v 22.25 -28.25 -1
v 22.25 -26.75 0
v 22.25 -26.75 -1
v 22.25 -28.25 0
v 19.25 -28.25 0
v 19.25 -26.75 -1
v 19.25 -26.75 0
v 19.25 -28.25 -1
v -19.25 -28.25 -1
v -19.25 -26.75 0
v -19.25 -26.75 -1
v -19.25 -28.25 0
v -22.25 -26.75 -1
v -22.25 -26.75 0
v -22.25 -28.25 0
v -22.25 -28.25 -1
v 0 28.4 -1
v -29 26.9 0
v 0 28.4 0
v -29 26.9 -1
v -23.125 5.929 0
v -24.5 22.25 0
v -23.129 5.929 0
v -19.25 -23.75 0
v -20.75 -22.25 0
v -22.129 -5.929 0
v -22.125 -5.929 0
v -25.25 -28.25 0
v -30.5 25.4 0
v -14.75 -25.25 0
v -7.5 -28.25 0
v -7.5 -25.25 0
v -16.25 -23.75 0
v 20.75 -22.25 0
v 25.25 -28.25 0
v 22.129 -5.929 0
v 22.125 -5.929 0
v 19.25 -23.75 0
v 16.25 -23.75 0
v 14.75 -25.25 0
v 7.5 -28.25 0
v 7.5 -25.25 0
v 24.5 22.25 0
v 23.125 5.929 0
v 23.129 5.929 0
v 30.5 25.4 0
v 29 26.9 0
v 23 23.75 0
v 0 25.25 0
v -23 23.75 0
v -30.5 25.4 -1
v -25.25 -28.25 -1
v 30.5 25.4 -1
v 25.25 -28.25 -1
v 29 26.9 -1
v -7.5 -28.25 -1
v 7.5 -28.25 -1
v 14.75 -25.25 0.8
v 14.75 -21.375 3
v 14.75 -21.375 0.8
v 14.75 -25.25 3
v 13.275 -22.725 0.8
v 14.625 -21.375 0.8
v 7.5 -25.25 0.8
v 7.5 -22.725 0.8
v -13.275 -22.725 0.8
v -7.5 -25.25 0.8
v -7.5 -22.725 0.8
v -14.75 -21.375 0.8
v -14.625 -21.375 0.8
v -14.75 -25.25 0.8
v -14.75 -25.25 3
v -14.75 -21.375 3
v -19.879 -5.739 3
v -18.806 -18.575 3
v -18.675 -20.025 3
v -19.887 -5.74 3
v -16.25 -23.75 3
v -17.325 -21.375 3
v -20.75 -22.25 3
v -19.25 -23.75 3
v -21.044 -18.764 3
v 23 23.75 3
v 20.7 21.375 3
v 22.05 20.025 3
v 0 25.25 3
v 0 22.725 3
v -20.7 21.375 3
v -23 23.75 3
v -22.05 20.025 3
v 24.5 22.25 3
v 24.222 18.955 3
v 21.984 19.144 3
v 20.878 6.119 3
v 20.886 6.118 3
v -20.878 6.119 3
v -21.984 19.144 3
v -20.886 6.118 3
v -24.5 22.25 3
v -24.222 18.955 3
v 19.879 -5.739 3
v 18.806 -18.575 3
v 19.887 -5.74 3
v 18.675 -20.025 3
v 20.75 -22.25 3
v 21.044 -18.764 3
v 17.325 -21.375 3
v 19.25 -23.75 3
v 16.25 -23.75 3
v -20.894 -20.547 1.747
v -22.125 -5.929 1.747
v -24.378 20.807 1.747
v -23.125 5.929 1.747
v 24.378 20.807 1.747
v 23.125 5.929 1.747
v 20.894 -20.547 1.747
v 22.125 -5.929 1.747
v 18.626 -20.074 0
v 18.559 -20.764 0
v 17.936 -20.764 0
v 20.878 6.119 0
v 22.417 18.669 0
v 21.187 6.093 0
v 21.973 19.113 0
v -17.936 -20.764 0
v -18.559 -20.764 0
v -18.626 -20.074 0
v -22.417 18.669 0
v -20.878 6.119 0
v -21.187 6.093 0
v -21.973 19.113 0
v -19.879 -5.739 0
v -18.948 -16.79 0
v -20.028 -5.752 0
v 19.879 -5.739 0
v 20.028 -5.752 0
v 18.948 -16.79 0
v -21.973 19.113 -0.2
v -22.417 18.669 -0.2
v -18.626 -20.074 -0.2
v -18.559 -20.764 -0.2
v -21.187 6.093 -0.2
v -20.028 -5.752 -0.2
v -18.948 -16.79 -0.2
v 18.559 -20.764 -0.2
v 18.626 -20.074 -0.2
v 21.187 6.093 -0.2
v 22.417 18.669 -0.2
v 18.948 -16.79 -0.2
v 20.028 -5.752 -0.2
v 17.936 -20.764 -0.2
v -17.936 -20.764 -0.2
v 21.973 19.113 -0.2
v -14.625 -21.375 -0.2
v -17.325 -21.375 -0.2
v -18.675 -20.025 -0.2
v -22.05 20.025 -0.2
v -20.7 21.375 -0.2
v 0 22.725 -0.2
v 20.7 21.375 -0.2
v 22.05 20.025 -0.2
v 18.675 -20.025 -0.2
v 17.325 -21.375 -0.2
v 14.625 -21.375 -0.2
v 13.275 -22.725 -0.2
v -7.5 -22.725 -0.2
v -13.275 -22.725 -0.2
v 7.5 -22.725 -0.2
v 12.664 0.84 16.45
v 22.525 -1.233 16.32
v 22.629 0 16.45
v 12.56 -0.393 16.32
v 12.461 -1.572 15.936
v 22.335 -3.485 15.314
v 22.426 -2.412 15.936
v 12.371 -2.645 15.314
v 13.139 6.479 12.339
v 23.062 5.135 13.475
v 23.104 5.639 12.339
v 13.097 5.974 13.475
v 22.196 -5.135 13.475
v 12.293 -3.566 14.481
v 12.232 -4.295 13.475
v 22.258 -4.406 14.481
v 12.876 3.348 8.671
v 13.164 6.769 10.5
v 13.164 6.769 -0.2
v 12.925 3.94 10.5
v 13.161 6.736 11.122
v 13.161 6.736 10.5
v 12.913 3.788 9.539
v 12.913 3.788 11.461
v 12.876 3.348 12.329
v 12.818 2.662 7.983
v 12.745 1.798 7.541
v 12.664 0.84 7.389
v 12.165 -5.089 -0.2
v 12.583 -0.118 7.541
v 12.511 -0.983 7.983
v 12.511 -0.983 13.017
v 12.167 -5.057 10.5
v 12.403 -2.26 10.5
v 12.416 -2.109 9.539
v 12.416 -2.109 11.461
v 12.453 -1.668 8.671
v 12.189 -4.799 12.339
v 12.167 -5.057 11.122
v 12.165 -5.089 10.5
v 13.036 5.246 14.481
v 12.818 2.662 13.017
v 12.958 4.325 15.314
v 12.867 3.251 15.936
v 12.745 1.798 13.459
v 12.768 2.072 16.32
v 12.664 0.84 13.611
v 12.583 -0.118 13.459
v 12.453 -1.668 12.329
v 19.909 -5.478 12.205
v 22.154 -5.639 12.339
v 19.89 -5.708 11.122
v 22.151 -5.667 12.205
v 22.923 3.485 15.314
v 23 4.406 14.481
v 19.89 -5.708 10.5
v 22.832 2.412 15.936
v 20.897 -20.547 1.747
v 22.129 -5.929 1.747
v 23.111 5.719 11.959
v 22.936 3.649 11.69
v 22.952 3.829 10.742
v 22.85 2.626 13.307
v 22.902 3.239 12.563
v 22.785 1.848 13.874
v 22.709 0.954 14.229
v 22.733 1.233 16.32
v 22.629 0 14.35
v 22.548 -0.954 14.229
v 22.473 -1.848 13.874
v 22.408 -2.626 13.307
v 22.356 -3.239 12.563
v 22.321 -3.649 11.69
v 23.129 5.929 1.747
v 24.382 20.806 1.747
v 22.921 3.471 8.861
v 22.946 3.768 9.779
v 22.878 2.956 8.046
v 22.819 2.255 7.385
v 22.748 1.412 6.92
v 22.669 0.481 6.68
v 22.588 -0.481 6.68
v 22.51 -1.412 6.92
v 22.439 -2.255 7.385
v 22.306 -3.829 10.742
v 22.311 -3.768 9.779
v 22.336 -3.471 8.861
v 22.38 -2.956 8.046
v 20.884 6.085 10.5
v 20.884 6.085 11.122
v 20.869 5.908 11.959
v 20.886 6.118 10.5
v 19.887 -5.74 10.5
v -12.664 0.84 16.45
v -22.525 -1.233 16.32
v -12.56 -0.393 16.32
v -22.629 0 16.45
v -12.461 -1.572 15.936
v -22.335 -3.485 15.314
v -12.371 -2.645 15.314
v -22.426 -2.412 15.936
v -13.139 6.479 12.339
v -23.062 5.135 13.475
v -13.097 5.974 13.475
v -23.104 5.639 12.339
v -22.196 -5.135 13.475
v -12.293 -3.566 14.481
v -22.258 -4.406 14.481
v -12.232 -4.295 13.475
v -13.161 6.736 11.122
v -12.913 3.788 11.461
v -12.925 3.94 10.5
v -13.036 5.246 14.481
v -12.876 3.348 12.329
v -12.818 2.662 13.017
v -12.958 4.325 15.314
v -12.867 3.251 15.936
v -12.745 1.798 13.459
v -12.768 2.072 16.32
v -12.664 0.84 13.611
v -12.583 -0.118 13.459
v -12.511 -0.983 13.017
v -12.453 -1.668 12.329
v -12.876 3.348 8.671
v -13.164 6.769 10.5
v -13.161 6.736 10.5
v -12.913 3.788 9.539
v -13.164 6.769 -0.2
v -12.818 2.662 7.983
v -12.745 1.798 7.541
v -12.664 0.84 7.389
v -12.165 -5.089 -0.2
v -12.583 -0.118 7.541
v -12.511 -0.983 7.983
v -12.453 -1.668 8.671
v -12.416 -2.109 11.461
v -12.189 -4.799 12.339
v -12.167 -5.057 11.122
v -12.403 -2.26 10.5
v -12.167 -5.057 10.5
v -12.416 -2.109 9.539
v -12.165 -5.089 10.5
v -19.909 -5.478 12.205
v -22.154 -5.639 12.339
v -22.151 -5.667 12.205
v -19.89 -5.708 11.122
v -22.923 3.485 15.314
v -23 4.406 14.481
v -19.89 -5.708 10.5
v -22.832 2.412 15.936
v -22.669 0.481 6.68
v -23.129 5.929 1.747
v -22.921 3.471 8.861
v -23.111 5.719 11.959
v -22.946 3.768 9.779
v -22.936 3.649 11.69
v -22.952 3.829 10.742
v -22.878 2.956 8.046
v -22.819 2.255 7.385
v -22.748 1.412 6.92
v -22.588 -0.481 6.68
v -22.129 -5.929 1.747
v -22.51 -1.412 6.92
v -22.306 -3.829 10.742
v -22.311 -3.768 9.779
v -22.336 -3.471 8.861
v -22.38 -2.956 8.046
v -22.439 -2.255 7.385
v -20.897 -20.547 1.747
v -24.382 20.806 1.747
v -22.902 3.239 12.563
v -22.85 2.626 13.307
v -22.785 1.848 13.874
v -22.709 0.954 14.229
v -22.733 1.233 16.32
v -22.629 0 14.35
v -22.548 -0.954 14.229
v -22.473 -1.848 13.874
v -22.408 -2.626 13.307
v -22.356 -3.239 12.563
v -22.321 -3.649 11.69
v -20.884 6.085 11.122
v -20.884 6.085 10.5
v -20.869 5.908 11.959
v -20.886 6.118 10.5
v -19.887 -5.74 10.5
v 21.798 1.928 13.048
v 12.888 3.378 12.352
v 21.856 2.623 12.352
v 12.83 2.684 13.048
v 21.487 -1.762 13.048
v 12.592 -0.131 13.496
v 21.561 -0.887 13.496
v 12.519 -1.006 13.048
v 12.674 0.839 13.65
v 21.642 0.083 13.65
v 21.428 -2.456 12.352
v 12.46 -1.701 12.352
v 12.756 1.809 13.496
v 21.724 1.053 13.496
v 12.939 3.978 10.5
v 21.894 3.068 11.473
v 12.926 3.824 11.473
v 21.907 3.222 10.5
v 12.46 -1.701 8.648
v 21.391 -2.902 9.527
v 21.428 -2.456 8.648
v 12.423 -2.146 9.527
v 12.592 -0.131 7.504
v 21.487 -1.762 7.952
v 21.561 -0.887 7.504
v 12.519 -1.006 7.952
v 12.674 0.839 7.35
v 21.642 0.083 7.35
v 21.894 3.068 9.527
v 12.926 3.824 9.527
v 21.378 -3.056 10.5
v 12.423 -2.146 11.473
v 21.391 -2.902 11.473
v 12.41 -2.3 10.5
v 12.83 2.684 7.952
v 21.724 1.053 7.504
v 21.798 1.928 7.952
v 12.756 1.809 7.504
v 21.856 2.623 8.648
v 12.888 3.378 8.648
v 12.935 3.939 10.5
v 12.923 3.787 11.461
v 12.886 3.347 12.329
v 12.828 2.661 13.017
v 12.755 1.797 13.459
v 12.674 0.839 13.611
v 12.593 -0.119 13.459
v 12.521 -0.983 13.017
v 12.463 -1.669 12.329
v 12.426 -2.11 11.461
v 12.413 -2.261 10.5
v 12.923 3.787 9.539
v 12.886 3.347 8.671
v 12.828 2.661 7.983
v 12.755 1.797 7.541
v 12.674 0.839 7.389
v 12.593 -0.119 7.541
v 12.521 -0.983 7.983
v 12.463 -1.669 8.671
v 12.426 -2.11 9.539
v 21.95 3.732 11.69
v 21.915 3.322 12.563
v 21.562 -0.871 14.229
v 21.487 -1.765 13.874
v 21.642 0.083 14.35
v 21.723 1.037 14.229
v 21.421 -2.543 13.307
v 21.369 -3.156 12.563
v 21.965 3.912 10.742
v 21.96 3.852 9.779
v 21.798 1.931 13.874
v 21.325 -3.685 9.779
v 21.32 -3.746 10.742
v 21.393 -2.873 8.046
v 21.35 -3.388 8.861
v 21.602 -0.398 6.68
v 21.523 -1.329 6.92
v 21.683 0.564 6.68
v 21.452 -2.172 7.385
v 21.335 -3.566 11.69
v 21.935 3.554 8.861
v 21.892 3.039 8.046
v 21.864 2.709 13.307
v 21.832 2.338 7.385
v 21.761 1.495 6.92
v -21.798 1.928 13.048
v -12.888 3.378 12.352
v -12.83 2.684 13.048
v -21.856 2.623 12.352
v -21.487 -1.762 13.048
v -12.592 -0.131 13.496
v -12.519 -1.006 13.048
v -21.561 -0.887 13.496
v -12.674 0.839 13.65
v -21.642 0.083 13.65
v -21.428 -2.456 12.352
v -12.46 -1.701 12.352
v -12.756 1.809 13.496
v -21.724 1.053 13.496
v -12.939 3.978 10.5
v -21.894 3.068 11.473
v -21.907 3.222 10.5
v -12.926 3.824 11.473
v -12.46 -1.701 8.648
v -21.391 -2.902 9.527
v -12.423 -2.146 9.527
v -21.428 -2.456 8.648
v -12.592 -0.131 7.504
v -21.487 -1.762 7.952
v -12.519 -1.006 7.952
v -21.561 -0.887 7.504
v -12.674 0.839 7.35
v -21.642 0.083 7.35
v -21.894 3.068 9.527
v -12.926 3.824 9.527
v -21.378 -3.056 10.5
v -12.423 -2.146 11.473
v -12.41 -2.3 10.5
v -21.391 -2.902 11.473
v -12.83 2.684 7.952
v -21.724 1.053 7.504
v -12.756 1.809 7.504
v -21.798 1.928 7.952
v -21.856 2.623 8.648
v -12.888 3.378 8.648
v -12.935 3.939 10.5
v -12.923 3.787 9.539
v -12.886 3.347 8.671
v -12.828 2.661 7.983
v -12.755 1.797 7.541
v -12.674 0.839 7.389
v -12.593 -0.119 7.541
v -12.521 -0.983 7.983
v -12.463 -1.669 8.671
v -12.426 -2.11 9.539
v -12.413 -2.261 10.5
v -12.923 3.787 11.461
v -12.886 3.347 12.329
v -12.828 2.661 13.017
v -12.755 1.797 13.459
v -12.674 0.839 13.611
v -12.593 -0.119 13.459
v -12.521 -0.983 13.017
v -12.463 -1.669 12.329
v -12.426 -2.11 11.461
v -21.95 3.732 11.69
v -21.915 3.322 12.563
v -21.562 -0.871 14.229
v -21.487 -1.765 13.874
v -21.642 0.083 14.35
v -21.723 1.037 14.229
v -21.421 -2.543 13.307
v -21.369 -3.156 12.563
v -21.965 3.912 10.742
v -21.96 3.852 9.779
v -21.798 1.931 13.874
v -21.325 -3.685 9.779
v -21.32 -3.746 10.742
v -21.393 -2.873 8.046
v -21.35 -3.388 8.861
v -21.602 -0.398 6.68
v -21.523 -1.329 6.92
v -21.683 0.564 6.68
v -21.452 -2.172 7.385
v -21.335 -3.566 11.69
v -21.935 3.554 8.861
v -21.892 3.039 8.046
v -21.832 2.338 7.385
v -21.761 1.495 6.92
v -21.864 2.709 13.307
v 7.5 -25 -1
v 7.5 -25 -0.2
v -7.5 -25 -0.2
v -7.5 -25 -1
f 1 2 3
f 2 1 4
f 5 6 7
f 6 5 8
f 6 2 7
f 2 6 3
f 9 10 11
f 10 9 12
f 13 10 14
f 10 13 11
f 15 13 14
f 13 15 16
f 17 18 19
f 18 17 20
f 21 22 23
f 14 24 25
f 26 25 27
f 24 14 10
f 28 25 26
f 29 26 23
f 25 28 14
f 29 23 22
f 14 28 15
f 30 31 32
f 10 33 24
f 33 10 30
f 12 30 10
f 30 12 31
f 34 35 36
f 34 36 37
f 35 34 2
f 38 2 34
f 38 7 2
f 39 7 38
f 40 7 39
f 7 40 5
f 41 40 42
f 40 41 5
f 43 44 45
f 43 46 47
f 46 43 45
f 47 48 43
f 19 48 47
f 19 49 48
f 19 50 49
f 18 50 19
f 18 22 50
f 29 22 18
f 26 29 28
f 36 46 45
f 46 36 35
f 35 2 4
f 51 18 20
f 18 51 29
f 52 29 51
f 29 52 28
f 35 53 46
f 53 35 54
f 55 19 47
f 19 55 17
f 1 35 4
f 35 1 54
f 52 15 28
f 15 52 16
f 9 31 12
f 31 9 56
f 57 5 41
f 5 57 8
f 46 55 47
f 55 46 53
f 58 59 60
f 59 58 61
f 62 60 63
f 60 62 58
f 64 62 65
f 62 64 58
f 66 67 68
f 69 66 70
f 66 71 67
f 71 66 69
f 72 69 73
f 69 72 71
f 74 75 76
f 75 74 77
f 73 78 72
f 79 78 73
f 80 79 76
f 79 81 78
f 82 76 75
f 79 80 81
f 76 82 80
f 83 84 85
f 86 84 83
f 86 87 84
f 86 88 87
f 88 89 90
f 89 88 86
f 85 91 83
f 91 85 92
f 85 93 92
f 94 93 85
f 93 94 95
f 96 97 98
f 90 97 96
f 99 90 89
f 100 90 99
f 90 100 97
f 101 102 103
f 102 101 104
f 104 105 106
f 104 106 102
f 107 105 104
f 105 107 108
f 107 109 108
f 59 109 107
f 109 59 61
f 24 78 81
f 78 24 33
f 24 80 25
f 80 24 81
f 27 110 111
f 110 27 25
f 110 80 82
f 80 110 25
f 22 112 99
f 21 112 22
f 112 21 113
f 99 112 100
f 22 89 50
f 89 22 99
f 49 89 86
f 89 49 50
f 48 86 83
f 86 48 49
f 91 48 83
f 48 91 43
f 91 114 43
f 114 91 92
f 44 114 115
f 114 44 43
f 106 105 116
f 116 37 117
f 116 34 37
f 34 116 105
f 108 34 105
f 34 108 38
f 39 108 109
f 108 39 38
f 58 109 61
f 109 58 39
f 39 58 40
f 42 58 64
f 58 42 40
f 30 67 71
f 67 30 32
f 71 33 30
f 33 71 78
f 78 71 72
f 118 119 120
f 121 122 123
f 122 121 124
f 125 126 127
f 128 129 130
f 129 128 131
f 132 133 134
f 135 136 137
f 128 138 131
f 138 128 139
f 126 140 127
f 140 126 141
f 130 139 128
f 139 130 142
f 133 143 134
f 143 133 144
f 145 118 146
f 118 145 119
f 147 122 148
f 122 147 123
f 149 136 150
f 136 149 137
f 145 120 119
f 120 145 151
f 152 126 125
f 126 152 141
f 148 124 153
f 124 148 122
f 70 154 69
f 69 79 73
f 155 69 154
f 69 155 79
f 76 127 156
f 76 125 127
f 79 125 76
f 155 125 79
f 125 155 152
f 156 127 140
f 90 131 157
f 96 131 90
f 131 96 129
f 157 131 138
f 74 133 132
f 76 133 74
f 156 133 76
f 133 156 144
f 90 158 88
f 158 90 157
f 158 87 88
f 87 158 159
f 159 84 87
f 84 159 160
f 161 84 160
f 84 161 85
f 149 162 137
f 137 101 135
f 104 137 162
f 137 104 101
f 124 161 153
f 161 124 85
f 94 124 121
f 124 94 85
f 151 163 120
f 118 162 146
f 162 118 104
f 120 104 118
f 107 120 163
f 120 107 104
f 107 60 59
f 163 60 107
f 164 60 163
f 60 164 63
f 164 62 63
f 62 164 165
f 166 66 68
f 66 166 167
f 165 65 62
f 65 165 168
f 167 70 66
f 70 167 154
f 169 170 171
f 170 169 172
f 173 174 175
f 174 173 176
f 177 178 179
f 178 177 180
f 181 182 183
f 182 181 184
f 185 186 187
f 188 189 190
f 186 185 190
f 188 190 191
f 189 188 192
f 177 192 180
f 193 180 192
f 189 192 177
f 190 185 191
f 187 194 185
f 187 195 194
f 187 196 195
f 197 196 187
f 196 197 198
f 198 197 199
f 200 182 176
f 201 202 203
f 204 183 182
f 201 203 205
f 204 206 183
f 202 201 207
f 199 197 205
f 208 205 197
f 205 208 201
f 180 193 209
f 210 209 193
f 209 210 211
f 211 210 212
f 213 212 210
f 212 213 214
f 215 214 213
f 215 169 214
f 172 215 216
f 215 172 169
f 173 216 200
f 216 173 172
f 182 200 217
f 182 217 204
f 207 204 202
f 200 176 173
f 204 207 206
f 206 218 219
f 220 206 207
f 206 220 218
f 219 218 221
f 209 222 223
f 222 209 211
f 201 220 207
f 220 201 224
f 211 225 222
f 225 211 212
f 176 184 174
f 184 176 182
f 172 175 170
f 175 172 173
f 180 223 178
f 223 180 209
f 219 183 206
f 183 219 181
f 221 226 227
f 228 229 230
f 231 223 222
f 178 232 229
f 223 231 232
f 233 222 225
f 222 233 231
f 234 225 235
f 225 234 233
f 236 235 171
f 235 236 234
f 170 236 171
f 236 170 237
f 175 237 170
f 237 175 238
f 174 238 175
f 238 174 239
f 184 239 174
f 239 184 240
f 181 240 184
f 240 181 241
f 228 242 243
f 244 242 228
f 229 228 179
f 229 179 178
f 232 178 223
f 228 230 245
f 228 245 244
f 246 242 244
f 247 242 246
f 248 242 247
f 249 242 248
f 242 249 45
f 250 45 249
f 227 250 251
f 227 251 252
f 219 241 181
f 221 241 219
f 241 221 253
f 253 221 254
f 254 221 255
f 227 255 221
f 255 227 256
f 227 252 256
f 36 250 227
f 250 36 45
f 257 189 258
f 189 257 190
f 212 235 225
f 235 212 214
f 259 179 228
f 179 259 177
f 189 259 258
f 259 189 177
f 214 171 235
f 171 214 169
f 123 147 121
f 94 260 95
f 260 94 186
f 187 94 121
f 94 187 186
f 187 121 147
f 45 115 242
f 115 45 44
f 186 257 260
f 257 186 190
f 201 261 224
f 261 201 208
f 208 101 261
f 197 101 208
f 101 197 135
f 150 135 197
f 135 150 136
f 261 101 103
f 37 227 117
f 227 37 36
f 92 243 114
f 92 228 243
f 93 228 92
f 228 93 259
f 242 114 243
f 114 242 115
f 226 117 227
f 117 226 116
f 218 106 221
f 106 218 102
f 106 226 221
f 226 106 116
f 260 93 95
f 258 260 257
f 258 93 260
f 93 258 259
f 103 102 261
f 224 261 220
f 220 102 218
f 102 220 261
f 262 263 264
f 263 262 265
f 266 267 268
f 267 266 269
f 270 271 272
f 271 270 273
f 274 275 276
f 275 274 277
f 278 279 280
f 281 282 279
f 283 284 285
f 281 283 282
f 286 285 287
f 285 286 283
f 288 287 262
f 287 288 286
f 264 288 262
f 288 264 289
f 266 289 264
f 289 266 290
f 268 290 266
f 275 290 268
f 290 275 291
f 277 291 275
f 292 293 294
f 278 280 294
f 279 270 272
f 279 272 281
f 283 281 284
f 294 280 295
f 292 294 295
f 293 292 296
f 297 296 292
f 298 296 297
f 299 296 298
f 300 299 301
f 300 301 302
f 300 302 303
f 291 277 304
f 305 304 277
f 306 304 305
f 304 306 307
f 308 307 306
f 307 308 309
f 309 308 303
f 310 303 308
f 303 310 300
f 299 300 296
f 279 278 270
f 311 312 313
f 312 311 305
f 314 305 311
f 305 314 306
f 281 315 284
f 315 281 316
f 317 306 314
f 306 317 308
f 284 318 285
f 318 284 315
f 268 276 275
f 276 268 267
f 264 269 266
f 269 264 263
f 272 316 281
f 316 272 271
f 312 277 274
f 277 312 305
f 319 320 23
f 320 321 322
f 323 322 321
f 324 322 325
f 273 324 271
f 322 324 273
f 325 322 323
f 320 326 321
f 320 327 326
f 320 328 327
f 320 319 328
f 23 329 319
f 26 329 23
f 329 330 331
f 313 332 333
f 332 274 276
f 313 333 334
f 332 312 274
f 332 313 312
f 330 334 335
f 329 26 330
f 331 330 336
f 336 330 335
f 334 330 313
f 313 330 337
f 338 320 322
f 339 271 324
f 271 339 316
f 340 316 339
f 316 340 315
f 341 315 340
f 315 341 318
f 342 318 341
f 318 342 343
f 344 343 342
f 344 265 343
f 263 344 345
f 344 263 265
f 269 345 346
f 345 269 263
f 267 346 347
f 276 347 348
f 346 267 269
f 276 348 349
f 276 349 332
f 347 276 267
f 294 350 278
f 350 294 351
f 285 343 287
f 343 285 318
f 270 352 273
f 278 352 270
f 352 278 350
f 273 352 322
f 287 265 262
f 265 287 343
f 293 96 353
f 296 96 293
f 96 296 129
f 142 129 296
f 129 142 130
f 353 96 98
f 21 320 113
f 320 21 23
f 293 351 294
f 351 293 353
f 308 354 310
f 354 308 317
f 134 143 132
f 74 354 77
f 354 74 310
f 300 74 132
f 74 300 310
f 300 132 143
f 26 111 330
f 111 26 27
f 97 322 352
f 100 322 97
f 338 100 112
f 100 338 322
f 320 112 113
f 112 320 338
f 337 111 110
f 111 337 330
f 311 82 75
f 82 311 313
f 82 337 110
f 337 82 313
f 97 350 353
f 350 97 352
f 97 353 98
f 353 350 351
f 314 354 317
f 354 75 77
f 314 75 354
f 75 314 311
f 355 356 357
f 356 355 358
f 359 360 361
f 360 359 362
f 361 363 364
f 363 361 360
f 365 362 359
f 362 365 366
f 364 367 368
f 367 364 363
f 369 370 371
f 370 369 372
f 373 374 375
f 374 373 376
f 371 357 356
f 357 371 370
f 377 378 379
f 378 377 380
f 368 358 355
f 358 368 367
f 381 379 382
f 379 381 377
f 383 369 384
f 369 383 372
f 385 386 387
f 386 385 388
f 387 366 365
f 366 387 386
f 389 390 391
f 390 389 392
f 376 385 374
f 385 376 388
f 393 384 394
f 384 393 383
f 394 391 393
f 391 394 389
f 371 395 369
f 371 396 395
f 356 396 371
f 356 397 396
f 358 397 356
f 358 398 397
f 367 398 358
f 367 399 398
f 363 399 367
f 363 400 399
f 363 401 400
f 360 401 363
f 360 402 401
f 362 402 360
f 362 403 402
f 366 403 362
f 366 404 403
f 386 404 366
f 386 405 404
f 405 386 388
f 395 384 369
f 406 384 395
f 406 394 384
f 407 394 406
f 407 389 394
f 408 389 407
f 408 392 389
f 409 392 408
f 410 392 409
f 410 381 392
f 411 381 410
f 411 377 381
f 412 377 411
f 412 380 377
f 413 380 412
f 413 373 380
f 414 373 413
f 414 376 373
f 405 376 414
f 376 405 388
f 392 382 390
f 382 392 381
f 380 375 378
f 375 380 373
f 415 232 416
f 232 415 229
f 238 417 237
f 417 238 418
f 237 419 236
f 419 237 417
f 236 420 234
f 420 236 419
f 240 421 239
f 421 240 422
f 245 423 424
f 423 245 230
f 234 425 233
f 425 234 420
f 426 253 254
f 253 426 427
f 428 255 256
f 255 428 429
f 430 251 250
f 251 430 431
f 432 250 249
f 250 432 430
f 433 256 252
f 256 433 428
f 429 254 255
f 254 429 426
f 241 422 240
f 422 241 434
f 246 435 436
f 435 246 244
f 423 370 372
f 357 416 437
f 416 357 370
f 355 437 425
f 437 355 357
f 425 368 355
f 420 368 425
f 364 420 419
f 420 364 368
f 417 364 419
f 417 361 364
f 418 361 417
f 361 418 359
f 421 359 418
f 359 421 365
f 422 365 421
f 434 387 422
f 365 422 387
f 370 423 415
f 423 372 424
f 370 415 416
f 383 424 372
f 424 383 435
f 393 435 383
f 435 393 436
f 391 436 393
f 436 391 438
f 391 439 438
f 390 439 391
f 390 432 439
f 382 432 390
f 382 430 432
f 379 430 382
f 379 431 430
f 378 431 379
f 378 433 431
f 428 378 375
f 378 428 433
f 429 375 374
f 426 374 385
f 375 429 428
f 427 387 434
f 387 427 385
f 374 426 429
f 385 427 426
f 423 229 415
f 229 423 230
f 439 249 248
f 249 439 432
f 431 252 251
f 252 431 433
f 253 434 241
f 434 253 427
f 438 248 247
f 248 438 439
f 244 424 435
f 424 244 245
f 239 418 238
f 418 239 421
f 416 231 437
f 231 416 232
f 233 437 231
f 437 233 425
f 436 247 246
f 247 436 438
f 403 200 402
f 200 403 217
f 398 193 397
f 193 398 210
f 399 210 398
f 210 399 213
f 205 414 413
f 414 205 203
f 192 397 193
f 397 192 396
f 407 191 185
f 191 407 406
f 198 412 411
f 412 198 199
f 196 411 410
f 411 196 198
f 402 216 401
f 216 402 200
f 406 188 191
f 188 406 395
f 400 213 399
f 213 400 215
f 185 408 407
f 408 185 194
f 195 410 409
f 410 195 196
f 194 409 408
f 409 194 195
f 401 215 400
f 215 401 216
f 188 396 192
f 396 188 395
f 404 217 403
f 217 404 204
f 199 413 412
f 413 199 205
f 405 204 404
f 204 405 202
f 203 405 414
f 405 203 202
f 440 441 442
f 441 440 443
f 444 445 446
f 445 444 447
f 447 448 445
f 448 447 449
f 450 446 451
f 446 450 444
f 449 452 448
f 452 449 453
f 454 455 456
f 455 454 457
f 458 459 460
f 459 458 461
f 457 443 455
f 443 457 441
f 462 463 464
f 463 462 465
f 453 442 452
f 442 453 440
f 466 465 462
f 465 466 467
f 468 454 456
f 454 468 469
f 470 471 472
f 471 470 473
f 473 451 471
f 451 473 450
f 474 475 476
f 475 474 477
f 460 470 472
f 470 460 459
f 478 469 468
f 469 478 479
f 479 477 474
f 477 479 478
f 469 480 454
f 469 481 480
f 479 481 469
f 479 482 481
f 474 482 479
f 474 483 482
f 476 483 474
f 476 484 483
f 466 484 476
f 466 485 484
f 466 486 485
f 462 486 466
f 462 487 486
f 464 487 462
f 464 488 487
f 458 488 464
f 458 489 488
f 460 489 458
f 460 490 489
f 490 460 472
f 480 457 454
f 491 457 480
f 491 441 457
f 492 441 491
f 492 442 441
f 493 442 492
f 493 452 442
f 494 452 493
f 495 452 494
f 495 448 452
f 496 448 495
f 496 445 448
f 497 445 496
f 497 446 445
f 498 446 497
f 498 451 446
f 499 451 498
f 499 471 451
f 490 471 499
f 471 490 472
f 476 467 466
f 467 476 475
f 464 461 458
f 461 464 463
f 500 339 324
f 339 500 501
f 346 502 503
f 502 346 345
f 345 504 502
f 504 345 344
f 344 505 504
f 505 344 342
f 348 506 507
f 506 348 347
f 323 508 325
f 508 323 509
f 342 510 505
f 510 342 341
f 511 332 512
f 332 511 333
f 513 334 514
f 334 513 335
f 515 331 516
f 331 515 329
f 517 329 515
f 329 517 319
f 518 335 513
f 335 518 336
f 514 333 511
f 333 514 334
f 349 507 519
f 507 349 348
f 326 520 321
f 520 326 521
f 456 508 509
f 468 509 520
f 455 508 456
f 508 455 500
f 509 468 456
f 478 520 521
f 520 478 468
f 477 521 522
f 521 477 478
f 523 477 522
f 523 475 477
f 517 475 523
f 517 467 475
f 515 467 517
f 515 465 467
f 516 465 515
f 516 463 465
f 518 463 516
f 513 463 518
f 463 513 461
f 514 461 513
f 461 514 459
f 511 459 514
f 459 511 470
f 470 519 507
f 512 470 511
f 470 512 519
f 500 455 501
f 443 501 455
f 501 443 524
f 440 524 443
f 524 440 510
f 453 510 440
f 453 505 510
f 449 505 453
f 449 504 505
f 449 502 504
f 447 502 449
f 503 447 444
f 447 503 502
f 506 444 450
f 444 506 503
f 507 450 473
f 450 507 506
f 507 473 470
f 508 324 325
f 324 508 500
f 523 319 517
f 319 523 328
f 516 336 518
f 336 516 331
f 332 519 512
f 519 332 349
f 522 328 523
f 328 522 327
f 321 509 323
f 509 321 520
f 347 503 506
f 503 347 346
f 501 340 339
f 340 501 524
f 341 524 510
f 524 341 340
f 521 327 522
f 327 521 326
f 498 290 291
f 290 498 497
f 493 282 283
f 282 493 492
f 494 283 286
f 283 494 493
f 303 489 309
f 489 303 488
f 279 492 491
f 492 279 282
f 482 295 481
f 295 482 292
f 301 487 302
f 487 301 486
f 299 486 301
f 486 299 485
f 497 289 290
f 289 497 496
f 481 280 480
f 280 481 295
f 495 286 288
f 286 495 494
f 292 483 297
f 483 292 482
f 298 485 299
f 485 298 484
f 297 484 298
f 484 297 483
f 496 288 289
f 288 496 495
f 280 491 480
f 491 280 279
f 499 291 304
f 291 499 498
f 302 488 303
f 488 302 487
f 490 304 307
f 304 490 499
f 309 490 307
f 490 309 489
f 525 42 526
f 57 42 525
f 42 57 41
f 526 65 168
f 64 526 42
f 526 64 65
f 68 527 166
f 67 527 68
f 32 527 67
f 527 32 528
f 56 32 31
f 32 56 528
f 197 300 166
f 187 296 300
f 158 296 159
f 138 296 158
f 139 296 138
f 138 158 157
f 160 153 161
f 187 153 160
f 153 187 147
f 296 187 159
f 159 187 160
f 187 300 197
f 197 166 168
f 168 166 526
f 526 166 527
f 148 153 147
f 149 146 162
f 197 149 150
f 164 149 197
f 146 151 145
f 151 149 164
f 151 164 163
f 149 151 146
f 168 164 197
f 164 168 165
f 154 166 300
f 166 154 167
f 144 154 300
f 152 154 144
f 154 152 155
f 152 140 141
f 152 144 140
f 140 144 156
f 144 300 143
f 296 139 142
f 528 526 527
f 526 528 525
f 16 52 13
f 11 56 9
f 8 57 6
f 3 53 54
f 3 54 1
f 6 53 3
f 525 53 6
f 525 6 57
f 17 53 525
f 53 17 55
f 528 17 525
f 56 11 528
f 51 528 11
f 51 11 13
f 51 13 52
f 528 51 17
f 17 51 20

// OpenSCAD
// file: triangles/triangles.scad
/*
Triangles.scad
 Author: Tim Koopman
 https://github.com/tkoopman/Delta-Diamond/blob/master/OpenSCAD/Triangles.scad
 [Edit: https://www.thingiverse.com/thing:220868/files]

         angleCA
           /|\
        a / H \ c
         /  |  \
 angleAB ------- angleBC
            b

Standard Parameters
  center: true/false
    If true same as centerXYZ = [true, true, true]

  centerXYZ: Vector of 3 true/false values [CenterX, CenterY, CenterZ]
    center must be left undef

  height: The 3D height of the Triangle. Ignored if heights defined

  heights: Vector of 3 height values heights @ [angleAB, angleBC, angleCA]
    If CenterZ is true each height will be centered individually, this means
    the shape will be different depending on CenterZ. Most times you will want
    CenterZ to be true to get the shape most people want.
*/

/*
Triangle
  a: Length of side a
  b: Length of side b
  angle: angle at point angleAB
*/
module Triangle(
      a, b, angle, height=1, heights=undef,
      center=undef, centerXYZ=[false,false,false])
{
  // Calculate Heights at each point
  heightAB = ((heights==undef) ? height : heights[0])/2;
  heightBC = ((heights==undef) ? height : heights[1])/2;
  heightCA = ((heights==undef) ? height : heights[2])/2;
  centerZ = (center || (center==undef && centerXYZ[2]))?0:max(heightAB,heightBC,heightCA);

  // Calculate Offsets for centering
  offsetX = (center || (center==undef && centerXYZ[0]))?((cos(angle)*a)+b)/3:0;
  offsetY = (center || (center==undef && centerXYZ[1]))?(sin(angle)*a)/3:0;

  pointAB1 = [-offsetX,-offsetY, centerZ-heightAB];
  pointAB2 = [-offsetX,-offsetY, centerZ+heightAB];
  pointBC1 = [b-offsetX,-offsetY, centerZ-heightBC];
  pointBC2 = [b-offsetX,-offsetY, centerZ+heightBC];
  pointCA1 = [(cos(angle)*a)-offsetX,(sin(angle)*a)-offsetY, centerZ-heightCA];
  pointCA2 = [(cos(angle)*a)-offsetX,(sin(angle)*a)-offsetY, centerZ+heightCA];

  polyhedron(
    points=[  pointAB1, pointBC1, pointCA1,
          pointAB2, pointBC2, pointCA2 ],
    faces=[
      [0, 1, 2],
      [3, 5, 4],
      [0, 3, 1],
      [1, 3, 4],
      [1, 4, 2],
      [2, 4, 5],
      [2, 5, 0],
      [0, 5, 3] ] );
}

/*
Isosceles Triangle
  Exactly 2 of the following paramaters must be defined.
  If all 3 defined H will be ignored.
  b: length of side b
  angle: angle at points angleAB & angleBC.
*/
module Isosceles_Triangle(
      b, angle, H=undef, height=1, heights=undef,
      center=undef, centerXYZ=[true, false, false])
{
  valid =   (angle!=undef)?((angle < 90) && (b!=undef||H!=undef)) : (b!=undef&&H!=undef);
  ANGLE = (angle!=undef) ? angle : atan(H / (b/2));
  a = (b==undef)?(H/sin((180-(angle*2))/2)) :
     (b / cos(ANGLE))/2;
  B = (b==undef)? (cos(angle)*a)*2:b;
  if (valid)
  {
    Triangle(a=a, b=B, angle=ANGLE, height=height, heights=heights,
          center=center, centerXYZ=centerXYZ);
  } else {
    echo("Invalid Isosceles_Triangle. Must specify any 2 of b, angle and H, and if angle used angle must be less than 90");
  }
}

/*
Right Angled Triangle
  Create a Right Angled Triangle where the hypotenuse will be calculated.

       |\
      a| \
       |  \
       ----
         b
  a: length of side a
  b: length of side b
*/
module Right_Angled_Triangle(
      a, b, height=1, heights=undef,
      center=undef, centerXYZ=[false, false, false])
{
  Triangle(a=a, b=b, angle=90, height=height, heights=heights,
        center=center, centerXYZ=centerXYZ);
}

/*
Wedge
  Is same as Right Angled Triangle with 2 different heights, and rotated.
  Good for creating support structures.
*/
module Wedge(a, b, w1, w2)
{
  rotate([90,0,0])
    Right_Angled_Triangle(a, b, heights=[w1, w2, w1], centerXYZ=[false, false, true]);
}

/*
Equilateral Triangle
  Create a Equilateral Triangle.

  l: Length of all sides (a, b & c)
  H: Triangle size will be based on the this 2D height
    When using H, l is ignored.
*/
module Equilateral_Triangle(
      l=10, H=undef, height=1, heights=undef,
      center=undef, centerXYZ=[true,false,false])
{
  L = (H==undef)?l:H/sin(60);
  Triangle(a=L,b=L,angle=60,height=height, heights=heights,
        center=center, centerXYZ=centerXYZ);
}

/*
Trapezoid
  Create a Basic Trapezoid (Based on Isosceles_Triangle)

            d
          /----\
         /  |   \
     a  /   H    \ c
       /    |     \
 angle ------------ angle
            b

  b: Length of side b
  angle: Angle at points angleAB & angleBC
  H: The 2D height at which the triangle should be cut to create the trapezoid
  heights: If vector of size 3 (Standard for triangles) both cd & da will be the same height, if vector have 4 values [ab,bc,cd,da] than each point can have different heights.
*/
module Trapezoid(
      b, angle=60, H, height=1, heights=undef,
      center=undef, centerXYZ=[true,false,false])
{
  validAngle = (angle < 90);
  adX = H / tan(angle);

  // Calculate Heights at each point
  heightAB = ((heights==undef) ? height : heights[0])/2;
  heightBC = ((heights==undef) ? height : heights[1])/2;
  heightCD = ((heights==undef) ? height : heights[2])/2;
  heightDA = ((heights==undef) ? height : ((len(heights) > 3)?heights[3]:heights[2]))/2;

  // Centers
  centerX = (center || (center==undef && centerXYZ[0]))?0:b/2;
  centerY = (center || (center==undef && centerXYZ[1]))?0:H/2;
  centerZ = (center || (center==undef && centerXYZ[2]))?0:max(heightAB,heightBC,heightCD,heightDA);

  // Points
  y = H/2;
  bx = b/2;
  dx = (b-(adX*2))/2;

  pointAB1 = [centerX-bx, centerY-y, centerZ-heightAB];
  pointAB2 = [centerX-bx, centerY-y, centerZ+heightAB];
  pointBC1 = [centerX+bx, centerY-y, centerZ-heightBC];
  pointBC2 = [centerX+bx, centerY-y, centerZ+heightBC];
  pointCD1 = [centerX+dx, centerY+y, centerZ-heightCD];
  pointCD2 = [centerX+dx, centerY+y, centerZ+heightCD];
  pointDA1 = [centerX-dx, centerY+y, centerZ-heightDA];
  pointDA2 = [centerX-dx, centerY+y, centerZ+heightDA];

  validH = (adX < b/2);

  if (validAngle && validH)
  {
    polyhedron(
      points=[  pointAB1, pointBC1, pointCD1, pointDA1,
            pointAB2, pointBC2, pointCD2, pointDA2 ],
      triangles=[
        [0, 1, 2],
        [0, 2, 3],
        [4, 6, 5],
        [4, 7, 6],
        [0, 4, 1],
        [1, 4, 5],
        [1, 5, 2],
        [2, 5, 6],
        [2, 6, 3],
        [3, 6, 7],
        [3, 7, 0],
        [0, 7, 4]  ] );
  } else {
    if (!validAngle) echo("Trapezoid invalid, angle must be less than 90");
    else echo("Trapezoid invalid, H is larger than triangle");
  }
}


// Examples
Triangle(a=5, b=15, angle=33, centerXYZ=[true,false,false]);
translate([20,0,0]) Right_Angled_Triangle(a=5, b=20, centerXYZ=[false,true,false]);
translate([45,0,0]) Wedge(a=5, b=20, w1=10, w2=5);
translate([-20,0,0]) Trapezoid(b=20, angle=33, H=4, height=5, centerXYZ=[true,false,true]);

translate([0,10,0]) Isosceles_Triangle(b=20, angle=33);
translate([30,10,0]) Isosceles_Triangle(b=20, H=5);
translate([-30,10,0]) Isosceles_Triangle(angle=33, H=5, center=true);

translate([15,-25,0]) Equilateral_Triangle(l=20);
translate([-15,-25,0]) Equilateral_Triangle(H=20);
// file: noyau/utils.scad
// Some random colors
module plastic()   { color([  1,  .7,   0]) children(); }
module gray()      { color([ .4,  .4,  .4]) children(); }
module black()     { color([ .3,  .3,  .3]) children(); }
module orange()    { color([  1,  .7,   0]) children(); }
module yellow()    { color([ .7,  .7,  .3]) children(); }
module green_pcb() { color([ .0,  .5, .25]) children(); }
module metal()     { color([ .7,  .7,  .7]) children(); }
module gold()      { color([ .8,  .5,  .0]) children(); }
module stainless() { color([.45, .43,  .5]) children(); }
module steel()     { color([.65, .67, .72]) children(); }
module iron()      { color([.36, .33, .33]) children(); }

// Same as mirror() but duplicates the children as opposed to just moving them.
module mirrored(v) {
  union() {
    children();
    mirror(v = v)
      children();
  } 
}

// Build a negative rounded corner to soften a square angle. Extra adds more
// material behind the rounded corner, which is sometimes useful to remove
// stuff.
module rounded_edge(radius, height, extra = 0) {
  translate([radius / 2, radius / 2, 0])
    difference() {
      translate([-extra/2, -extra/2, 0])
      cube([radius + .01 + extra, radius + .01 + extra, height + .01], center = true);
      translate([radius / 2, radius /2, 0])
        cylinder(r = radius, h = height + .02, center = true);
    }
}

// Build a cube with the corners in the z plane softened.
module rounded_cube(v, radius) {
  difference() {
    cube(v, center=true);
    mirrored([0, 1, 0]) mirrored([1, 0, 0])
      translate([-v[0]/2,-v[1]/2,0])
        rounded_edge(radius, v[2]);
  }
}

function number_of_circle_fragments(r) =
  $fn>0 ? ($fn >= 3 ? $fn : 3)
        : ceil(max(min(360 / $fa,
                       r * 2 * PI / $fs),
                   5));

// Build a cylinder garanteed to fit and element of the given radius. Aka, a
// little bit larger than a regular cylinder. Very useful with small fn.
module cylinder_outer(height,radius) {
  fn = number_of_circle_fragments(radius);
  fudge = 1 / cos(180 / fn);
  cylinder(h = height, r = radius * fudge, center = true);
}

// examples
translate([20, 20, 0]) rounded_edge(10, 5, 3);
translate([-20, 20, 0]) rounded_cube([20,15,5], 5);
mirrored([1, 0, 0]) translate([-20, -20, 0])difference() {
  cylinder_outer(5, 12, $fn = 6);
  cylinder(h = 6, r = 12, center = true);
}
// file: noyau_utils.scad
// Same as mirror() but duplicates the children as opposed to just moving them.
module mirrored(v) {
  union() {
    children();
    mirror(v = v)
      children();
  } 
}

// Build a negative rounded corner to soften a square angle. Extra adds more
// material behind the rounded corner, which is sometimes useful to remove
// stuff.
module rounded_edge(radius, height, extra = 0) {
  translate([radius / 2, radius / 2, 0])
    difference() {
      translate([-extra/2, -extra/2, 0])
      cube([radius + .01 + extra, radius + .01 + extra, height + .01], center = true);
      translate([radius / 2, radius /2, 0])
        cylinder(r = radius, h = height + .02, center = true);
    }
}

// Build a cube with the corners in the z plane softened.
module rounded_cube(v, radius) {
  difference() {
    cube(v, center=true);
    mirrored([0, 1, 0]) mirrored([1, 0, 0])
      translate([-v[0]/2,-v[1]/2,0])
        rounded_edge(radius, v[2]);
  }
}

function number_of_circle_fragments(r) =
  $fn>0 ? ($fn >= 3 ? $fn : 3)
        : ceil(max(min(360 / $fa,
                       r * 2 * PI / $fs),
                   5));

// Build a cylinder garanteed to fit and element of the given radius. Aka, a
// little bit larger than a regular cylinder. Very useful with small fn.
module cylinder_outer(height,radius) {
  fn = number_of_circle_fragments(radius);
  fudge = 1 / cos(180 / fn);
  cylinder(h = height, r = radius * fudge, center = true);
}

// examples
translate([20, 20, 0]) rounded_edge(10, 5, 3);
translate([-20, 20, 0]) rounded_cube([20,15,5], 5);
mirrored([1, 0, 0]) translate([-20, -20, 0])difference() {
  cylinder_outer(5, 12, $fn = 6);
  cylinder(h = 6, r = 12, center = true);
}
// main file
use <GPS_790_insert.scad>
use <noyau_utils.scad>

rotate([180, 0, 0]) difference() {
  union() {
    shape_with_holes(back_hole = true, amps_inserts = false);
    translate([-24, -25, .2]) cube([48,50,5]);
  }
  translate([-40, -40, 1]) cube([80,80,80]);
 //cube([37,15,35], center = true);
}
